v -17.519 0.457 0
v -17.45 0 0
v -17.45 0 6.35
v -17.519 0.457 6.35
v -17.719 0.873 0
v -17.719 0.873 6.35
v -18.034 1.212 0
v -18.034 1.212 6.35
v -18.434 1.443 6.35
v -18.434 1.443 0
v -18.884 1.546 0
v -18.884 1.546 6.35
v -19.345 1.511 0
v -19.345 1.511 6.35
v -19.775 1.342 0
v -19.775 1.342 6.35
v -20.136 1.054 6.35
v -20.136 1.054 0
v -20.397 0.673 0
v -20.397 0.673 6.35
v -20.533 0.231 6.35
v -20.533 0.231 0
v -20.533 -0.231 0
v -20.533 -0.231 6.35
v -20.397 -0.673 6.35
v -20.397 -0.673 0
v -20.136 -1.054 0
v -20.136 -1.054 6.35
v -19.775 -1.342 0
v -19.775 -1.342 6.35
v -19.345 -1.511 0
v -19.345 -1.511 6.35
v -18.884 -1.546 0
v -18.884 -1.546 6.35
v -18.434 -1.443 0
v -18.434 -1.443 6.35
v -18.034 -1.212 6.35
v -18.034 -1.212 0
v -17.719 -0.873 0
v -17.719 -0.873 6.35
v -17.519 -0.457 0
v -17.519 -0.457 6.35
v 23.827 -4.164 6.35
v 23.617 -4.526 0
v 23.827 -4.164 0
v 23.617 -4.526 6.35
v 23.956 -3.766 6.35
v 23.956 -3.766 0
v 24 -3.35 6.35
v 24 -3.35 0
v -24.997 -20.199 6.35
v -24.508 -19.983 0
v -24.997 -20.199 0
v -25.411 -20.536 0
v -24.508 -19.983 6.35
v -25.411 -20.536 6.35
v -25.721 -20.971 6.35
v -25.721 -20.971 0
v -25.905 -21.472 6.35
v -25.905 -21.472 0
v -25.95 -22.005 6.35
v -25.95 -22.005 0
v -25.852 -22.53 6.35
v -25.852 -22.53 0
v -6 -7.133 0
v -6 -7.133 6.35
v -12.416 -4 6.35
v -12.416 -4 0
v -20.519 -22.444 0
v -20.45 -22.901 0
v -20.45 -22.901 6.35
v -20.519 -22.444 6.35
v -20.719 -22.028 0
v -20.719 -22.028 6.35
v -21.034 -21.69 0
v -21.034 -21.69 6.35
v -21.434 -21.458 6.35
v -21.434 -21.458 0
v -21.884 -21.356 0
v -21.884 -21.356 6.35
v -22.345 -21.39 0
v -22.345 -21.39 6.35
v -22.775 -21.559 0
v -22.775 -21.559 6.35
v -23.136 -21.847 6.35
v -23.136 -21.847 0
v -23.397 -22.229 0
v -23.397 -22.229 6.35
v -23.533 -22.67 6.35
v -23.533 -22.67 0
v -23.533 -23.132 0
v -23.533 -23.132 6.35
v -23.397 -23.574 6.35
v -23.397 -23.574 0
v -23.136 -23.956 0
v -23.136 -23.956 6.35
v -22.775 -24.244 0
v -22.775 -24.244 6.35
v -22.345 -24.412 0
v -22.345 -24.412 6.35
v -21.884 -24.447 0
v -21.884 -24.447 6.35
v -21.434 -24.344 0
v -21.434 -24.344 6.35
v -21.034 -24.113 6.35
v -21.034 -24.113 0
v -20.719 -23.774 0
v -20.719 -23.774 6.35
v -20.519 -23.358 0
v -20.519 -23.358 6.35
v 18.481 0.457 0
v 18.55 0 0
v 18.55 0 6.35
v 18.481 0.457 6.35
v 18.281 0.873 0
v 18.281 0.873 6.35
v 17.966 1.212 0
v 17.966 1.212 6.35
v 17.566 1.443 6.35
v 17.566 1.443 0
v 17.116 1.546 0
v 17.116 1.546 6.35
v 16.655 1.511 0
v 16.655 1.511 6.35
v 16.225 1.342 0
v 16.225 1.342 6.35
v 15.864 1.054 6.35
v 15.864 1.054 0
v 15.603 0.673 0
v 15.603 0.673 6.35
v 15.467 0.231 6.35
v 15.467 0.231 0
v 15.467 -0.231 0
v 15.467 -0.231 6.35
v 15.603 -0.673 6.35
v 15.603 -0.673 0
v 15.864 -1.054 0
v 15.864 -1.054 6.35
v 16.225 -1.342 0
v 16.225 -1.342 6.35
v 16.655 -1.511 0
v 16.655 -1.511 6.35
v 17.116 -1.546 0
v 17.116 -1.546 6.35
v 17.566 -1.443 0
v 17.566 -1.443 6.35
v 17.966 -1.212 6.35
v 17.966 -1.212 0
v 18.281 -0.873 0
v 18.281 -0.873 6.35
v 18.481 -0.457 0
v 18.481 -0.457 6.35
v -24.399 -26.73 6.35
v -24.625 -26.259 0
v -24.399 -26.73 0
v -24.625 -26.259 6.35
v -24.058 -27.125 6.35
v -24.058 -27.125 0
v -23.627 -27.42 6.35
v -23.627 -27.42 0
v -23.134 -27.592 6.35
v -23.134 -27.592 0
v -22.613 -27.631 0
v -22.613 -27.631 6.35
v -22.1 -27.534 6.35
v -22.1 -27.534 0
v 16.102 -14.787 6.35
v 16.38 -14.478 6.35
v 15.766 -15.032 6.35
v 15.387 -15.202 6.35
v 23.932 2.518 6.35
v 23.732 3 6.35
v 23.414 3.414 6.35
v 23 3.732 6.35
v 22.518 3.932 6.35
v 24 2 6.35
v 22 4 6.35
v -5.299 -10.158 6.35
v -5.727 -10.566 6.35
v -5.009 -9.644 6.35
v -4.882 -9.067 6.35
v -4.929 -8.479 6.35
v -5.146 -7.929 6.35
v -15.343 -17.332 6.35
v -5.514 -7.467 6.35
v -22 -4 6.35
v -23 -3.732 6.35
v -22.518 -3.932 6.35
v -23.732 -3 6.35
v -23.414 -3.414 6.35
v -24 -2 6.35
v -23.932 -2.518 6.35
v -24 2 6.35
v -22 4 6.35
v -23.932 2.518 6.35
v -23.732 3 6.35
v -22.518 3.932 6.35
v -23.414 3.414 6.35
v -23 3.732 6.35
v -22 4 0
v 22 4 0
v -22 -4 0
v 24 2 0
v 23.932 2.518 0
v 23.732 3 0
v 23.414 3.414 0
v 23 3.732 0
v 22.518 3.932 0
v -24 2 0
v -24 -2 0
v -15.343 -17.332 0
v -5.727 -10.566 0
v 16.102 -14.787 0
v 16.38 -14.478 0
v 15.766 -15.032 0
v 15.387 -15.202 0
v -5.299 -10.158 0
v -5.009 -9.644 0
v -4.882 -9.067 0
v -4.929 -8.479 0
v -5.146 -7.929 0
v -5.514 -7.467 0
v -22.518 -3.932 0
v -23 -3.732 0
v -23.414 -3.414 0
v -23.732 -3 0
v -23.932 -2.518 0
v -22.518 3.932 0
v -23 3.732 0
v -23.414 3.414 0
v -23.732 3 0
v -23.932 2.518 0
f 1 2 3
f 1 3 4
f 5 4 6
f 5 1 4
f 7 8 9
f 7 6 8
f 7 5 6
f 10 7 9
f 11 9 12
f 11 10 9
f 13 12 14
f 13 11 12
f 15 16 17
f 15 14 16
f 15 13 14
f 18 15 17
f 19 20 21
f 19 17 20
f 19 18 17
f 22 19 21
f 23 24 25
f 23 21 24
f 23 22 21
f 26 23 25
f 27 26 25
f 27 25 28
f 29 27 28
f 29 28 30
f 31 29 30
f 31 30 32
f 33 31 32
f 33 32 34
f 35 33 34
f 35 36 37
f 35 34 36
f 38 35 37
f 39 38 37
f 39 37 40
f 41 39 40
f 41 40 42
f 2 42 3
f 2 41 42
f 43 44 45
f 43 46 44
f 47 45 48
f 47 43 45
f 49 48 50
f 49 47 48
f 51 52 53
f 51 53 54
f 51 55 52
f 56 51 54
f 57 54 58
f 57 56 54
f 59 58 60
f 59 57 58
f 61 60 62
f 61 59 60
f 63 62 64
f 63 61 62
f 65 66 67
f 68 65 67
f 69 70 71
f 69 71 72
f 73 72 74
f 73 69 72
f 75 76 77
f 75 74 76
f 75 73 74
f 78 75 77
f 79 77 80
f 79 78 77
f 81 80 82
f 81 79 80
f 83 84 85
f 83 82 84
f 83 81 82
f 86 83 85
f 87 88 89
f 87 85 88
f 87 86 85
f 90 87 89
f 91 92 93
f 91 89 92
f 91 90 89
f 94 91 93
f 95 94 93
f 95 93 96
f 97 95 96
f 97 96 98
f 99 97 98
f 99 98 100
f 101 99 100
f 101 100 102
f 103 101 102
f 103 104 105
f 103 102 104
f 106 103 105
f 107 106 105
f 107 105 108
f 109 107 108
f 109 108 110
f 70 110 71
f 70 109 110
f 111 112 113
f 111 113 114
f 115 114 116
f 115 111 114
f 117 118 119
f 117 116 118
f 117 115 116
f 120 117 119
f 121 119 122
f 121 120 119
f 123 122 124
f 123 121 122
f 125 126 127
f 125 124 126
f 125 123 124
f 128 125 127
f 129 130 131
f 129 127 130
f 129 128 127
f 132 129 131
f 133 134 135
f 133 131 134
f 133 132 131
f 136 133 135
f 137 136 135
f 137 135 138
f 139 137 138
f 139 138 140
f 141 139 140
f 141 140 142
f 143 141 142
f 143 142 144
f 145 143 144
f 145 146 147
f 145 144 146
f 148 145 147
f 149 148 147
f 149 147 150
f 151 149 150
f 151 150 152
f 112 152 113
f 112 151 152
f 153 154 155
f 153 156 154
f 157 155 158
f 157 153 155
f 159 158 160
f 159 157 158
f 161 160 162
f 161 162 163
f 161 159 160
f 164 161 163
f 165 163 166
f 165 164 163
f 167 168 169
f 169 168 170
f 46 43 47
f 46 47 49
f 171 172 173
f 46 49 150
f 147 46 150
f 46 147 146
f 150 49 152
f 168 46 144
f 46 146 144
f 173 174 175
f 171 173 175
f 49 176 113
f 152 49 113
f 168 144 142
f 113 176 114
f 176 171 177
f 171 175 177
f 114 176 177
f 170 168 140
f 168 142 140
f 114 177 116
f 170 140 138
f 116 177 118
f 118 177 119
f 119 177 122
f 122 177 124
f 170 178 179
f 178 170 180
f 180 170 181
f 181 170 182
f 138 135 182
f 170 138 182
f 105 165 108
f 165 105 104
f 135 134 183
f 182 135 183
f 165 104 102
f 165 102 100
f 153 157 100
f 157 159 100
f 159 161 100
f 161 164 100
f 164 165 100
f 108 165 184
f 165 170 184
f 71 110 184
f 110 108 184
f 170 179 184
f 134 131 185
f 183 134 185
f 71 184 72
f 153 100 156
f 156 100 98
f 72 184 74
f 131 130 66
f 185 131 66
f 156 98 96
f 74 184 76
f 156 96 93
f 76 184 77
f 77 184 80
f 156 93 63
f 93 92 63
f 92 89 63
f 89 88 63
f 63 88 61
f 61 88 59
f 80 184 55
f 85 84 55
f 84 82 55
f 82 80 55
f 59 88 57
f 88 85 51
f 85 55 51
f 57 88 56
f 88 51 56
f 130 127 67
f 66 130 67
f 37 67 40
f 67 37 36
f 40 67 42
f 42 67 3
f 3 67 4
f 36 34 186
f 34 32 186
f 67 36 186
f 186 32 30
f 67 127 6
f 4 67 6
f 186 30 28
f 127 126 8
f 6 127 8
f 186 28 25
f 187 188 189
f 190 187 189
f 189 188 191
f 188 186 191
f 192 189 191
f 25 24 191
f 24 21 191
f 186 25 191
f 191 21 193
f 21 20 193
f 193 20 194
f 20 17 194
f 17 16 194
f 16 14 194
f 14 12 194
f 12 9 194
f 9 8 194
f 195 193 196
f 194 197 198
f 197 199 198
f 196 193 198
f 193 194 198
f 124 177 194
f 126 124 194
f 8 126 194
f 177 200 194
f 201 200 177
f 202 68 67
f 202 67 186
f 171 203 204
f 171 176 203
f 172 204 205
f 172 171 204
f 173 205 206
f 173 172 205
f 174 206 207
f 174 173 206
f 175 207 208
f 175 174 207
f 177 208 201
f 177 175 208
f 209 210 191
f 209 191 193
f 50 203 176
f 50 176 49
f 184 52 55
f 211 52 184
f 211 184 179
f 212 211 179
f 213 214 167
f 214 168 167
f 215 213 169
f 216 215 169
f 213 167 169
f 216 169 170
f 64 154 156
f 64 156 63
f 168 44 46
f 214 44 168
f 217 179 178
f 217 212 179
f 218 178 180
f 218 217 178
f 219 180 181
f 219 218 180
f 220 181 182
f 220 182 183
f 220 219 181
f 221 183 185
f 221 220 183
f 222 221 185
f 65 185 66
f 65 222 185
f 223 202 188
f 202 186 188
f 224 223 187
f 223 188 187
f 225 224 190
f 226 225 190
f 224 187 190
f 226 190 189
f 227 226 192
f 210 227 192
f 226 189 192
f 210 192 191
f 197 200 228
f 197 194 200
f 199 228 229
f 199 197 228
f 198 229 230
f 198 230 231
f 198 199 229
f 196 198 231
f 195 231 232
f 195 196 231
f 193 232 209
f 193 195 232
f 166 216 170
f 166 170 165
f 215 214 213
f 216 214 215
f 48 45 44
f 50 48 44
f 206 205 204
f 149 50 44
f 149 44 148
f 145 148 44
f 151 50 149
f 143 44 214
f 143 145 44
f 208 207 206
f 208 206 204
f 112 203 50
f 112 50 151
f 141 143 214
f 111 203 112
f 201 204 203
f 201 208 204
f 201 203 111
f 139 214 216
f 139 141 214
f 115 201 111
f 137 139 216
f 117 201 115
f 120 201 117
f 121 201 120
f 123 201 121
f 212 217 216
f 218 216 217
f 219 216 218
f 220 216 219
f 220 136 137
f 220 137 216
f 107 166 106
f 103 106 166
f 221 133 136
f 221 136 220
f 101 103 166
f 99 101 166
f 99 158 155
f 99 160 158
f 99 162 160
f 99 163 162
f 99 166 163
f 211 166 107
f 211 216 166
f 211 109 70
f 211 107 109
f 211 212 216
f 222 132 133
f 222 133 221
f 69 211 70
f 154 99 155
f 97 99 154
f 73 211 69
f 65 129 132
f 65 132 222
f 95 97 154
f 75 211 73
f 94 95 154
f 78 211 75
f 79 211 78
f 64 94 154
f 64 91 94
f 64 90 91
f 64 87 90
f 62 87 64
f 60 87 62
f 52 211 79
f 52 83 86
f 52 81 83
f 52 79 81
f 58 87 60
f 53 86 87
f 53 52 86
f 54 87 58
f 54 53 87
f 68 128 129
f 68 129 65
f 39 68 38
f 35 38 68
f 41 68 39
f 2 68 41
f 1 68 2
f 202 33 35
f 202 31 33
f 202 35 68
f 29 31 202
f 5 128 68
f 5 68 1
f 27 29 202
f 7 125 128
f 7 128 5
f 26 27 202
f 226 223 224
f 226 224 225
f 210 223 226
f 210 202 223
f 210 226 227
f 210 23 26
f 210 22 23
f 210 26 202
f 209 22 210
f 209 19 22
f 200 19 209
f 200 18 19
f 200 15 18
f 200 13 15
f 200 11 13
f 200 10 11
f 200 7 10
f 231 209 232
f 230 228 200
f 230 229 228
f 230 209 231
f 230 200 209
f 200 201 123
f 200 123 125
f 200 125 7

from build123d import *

# Parameters (mm, degrees)
BOSS_EXTRUDE1_DEPTH     = 6.35
CUT_EXTRUDE3_DEPTH      = 40.185503571
CUT_EXTRUDE3_DEPTH_BACK = 40.185503571
SKETCH2_R               = 1.55
BOSS_EXTRUDE2_DEPTH     = 6.35
FILLET1_R               = 2


with BuildPart() as part:
    # Sketch1 → Boss-Extrude1 (new body)
    with BuildSketch(Plane.XY):
        Polygon((24, -4), (16, -15), (-24, -28.159033899), (-26.5, -20.559691822), (10, -10), (14, -4), (-24, -4), (-24, 4), (24, 4), align=None)
    extrude(amount=BOSS_EXTRUDE1_DEPTH)

    # Sketch2 → Cut-Extrude3 (cut, two sides: drawn at the far end of the back side and taken through both)
    with BuildSketch(Plane.XY.offset(-CUT_EXTRUDE3_DEPTH_BACK)):
        with Locations((-19, 0)):
            Circle(SKETCH2_R)
        with Locations((17, 0)):
            Circle(SKETCH2_R)
        with Locations((-22, -22.901341131)):
            Circle(SKETCH2_R)
    extrude(amount=CUT_EXTRUDE3_DEPTH + CUT_EXTRUDE3_DEPTH_BACK, mode=Mode.SUBTRACT)

    # Sketch3 → Boss-Extrude2 (add)
    with BuildSketch(Plane.XY.offset(6.35)):
        Polygon((-12.416374587, -4), (14, -4), (10, -10), (-15.342860583, -17.33185747), (-2.958518174, -8.617728358), align=None)
    extrude(amount=-BOSS_EXTRUDE2_DEPTH)

    # Fillet1
    fillet1_edges = [part.edges().sort_by_distance(p)[0] for p in [
        (24, -4, 3.175),
        (16, -15, 3.175),
        (-24, -28.159033899, 3.175),
        (-26.5, -20.559691822, 3.175),
        (-24, -4, 3.175),
        (-24, 4, 3.175),
        (24, 4, 3.175),
        (-2.958518174, -8.617728358, 3.175),
    ]]
    fillet(fillet1_edges, radius=FILLET1_R)


solid = part.part
